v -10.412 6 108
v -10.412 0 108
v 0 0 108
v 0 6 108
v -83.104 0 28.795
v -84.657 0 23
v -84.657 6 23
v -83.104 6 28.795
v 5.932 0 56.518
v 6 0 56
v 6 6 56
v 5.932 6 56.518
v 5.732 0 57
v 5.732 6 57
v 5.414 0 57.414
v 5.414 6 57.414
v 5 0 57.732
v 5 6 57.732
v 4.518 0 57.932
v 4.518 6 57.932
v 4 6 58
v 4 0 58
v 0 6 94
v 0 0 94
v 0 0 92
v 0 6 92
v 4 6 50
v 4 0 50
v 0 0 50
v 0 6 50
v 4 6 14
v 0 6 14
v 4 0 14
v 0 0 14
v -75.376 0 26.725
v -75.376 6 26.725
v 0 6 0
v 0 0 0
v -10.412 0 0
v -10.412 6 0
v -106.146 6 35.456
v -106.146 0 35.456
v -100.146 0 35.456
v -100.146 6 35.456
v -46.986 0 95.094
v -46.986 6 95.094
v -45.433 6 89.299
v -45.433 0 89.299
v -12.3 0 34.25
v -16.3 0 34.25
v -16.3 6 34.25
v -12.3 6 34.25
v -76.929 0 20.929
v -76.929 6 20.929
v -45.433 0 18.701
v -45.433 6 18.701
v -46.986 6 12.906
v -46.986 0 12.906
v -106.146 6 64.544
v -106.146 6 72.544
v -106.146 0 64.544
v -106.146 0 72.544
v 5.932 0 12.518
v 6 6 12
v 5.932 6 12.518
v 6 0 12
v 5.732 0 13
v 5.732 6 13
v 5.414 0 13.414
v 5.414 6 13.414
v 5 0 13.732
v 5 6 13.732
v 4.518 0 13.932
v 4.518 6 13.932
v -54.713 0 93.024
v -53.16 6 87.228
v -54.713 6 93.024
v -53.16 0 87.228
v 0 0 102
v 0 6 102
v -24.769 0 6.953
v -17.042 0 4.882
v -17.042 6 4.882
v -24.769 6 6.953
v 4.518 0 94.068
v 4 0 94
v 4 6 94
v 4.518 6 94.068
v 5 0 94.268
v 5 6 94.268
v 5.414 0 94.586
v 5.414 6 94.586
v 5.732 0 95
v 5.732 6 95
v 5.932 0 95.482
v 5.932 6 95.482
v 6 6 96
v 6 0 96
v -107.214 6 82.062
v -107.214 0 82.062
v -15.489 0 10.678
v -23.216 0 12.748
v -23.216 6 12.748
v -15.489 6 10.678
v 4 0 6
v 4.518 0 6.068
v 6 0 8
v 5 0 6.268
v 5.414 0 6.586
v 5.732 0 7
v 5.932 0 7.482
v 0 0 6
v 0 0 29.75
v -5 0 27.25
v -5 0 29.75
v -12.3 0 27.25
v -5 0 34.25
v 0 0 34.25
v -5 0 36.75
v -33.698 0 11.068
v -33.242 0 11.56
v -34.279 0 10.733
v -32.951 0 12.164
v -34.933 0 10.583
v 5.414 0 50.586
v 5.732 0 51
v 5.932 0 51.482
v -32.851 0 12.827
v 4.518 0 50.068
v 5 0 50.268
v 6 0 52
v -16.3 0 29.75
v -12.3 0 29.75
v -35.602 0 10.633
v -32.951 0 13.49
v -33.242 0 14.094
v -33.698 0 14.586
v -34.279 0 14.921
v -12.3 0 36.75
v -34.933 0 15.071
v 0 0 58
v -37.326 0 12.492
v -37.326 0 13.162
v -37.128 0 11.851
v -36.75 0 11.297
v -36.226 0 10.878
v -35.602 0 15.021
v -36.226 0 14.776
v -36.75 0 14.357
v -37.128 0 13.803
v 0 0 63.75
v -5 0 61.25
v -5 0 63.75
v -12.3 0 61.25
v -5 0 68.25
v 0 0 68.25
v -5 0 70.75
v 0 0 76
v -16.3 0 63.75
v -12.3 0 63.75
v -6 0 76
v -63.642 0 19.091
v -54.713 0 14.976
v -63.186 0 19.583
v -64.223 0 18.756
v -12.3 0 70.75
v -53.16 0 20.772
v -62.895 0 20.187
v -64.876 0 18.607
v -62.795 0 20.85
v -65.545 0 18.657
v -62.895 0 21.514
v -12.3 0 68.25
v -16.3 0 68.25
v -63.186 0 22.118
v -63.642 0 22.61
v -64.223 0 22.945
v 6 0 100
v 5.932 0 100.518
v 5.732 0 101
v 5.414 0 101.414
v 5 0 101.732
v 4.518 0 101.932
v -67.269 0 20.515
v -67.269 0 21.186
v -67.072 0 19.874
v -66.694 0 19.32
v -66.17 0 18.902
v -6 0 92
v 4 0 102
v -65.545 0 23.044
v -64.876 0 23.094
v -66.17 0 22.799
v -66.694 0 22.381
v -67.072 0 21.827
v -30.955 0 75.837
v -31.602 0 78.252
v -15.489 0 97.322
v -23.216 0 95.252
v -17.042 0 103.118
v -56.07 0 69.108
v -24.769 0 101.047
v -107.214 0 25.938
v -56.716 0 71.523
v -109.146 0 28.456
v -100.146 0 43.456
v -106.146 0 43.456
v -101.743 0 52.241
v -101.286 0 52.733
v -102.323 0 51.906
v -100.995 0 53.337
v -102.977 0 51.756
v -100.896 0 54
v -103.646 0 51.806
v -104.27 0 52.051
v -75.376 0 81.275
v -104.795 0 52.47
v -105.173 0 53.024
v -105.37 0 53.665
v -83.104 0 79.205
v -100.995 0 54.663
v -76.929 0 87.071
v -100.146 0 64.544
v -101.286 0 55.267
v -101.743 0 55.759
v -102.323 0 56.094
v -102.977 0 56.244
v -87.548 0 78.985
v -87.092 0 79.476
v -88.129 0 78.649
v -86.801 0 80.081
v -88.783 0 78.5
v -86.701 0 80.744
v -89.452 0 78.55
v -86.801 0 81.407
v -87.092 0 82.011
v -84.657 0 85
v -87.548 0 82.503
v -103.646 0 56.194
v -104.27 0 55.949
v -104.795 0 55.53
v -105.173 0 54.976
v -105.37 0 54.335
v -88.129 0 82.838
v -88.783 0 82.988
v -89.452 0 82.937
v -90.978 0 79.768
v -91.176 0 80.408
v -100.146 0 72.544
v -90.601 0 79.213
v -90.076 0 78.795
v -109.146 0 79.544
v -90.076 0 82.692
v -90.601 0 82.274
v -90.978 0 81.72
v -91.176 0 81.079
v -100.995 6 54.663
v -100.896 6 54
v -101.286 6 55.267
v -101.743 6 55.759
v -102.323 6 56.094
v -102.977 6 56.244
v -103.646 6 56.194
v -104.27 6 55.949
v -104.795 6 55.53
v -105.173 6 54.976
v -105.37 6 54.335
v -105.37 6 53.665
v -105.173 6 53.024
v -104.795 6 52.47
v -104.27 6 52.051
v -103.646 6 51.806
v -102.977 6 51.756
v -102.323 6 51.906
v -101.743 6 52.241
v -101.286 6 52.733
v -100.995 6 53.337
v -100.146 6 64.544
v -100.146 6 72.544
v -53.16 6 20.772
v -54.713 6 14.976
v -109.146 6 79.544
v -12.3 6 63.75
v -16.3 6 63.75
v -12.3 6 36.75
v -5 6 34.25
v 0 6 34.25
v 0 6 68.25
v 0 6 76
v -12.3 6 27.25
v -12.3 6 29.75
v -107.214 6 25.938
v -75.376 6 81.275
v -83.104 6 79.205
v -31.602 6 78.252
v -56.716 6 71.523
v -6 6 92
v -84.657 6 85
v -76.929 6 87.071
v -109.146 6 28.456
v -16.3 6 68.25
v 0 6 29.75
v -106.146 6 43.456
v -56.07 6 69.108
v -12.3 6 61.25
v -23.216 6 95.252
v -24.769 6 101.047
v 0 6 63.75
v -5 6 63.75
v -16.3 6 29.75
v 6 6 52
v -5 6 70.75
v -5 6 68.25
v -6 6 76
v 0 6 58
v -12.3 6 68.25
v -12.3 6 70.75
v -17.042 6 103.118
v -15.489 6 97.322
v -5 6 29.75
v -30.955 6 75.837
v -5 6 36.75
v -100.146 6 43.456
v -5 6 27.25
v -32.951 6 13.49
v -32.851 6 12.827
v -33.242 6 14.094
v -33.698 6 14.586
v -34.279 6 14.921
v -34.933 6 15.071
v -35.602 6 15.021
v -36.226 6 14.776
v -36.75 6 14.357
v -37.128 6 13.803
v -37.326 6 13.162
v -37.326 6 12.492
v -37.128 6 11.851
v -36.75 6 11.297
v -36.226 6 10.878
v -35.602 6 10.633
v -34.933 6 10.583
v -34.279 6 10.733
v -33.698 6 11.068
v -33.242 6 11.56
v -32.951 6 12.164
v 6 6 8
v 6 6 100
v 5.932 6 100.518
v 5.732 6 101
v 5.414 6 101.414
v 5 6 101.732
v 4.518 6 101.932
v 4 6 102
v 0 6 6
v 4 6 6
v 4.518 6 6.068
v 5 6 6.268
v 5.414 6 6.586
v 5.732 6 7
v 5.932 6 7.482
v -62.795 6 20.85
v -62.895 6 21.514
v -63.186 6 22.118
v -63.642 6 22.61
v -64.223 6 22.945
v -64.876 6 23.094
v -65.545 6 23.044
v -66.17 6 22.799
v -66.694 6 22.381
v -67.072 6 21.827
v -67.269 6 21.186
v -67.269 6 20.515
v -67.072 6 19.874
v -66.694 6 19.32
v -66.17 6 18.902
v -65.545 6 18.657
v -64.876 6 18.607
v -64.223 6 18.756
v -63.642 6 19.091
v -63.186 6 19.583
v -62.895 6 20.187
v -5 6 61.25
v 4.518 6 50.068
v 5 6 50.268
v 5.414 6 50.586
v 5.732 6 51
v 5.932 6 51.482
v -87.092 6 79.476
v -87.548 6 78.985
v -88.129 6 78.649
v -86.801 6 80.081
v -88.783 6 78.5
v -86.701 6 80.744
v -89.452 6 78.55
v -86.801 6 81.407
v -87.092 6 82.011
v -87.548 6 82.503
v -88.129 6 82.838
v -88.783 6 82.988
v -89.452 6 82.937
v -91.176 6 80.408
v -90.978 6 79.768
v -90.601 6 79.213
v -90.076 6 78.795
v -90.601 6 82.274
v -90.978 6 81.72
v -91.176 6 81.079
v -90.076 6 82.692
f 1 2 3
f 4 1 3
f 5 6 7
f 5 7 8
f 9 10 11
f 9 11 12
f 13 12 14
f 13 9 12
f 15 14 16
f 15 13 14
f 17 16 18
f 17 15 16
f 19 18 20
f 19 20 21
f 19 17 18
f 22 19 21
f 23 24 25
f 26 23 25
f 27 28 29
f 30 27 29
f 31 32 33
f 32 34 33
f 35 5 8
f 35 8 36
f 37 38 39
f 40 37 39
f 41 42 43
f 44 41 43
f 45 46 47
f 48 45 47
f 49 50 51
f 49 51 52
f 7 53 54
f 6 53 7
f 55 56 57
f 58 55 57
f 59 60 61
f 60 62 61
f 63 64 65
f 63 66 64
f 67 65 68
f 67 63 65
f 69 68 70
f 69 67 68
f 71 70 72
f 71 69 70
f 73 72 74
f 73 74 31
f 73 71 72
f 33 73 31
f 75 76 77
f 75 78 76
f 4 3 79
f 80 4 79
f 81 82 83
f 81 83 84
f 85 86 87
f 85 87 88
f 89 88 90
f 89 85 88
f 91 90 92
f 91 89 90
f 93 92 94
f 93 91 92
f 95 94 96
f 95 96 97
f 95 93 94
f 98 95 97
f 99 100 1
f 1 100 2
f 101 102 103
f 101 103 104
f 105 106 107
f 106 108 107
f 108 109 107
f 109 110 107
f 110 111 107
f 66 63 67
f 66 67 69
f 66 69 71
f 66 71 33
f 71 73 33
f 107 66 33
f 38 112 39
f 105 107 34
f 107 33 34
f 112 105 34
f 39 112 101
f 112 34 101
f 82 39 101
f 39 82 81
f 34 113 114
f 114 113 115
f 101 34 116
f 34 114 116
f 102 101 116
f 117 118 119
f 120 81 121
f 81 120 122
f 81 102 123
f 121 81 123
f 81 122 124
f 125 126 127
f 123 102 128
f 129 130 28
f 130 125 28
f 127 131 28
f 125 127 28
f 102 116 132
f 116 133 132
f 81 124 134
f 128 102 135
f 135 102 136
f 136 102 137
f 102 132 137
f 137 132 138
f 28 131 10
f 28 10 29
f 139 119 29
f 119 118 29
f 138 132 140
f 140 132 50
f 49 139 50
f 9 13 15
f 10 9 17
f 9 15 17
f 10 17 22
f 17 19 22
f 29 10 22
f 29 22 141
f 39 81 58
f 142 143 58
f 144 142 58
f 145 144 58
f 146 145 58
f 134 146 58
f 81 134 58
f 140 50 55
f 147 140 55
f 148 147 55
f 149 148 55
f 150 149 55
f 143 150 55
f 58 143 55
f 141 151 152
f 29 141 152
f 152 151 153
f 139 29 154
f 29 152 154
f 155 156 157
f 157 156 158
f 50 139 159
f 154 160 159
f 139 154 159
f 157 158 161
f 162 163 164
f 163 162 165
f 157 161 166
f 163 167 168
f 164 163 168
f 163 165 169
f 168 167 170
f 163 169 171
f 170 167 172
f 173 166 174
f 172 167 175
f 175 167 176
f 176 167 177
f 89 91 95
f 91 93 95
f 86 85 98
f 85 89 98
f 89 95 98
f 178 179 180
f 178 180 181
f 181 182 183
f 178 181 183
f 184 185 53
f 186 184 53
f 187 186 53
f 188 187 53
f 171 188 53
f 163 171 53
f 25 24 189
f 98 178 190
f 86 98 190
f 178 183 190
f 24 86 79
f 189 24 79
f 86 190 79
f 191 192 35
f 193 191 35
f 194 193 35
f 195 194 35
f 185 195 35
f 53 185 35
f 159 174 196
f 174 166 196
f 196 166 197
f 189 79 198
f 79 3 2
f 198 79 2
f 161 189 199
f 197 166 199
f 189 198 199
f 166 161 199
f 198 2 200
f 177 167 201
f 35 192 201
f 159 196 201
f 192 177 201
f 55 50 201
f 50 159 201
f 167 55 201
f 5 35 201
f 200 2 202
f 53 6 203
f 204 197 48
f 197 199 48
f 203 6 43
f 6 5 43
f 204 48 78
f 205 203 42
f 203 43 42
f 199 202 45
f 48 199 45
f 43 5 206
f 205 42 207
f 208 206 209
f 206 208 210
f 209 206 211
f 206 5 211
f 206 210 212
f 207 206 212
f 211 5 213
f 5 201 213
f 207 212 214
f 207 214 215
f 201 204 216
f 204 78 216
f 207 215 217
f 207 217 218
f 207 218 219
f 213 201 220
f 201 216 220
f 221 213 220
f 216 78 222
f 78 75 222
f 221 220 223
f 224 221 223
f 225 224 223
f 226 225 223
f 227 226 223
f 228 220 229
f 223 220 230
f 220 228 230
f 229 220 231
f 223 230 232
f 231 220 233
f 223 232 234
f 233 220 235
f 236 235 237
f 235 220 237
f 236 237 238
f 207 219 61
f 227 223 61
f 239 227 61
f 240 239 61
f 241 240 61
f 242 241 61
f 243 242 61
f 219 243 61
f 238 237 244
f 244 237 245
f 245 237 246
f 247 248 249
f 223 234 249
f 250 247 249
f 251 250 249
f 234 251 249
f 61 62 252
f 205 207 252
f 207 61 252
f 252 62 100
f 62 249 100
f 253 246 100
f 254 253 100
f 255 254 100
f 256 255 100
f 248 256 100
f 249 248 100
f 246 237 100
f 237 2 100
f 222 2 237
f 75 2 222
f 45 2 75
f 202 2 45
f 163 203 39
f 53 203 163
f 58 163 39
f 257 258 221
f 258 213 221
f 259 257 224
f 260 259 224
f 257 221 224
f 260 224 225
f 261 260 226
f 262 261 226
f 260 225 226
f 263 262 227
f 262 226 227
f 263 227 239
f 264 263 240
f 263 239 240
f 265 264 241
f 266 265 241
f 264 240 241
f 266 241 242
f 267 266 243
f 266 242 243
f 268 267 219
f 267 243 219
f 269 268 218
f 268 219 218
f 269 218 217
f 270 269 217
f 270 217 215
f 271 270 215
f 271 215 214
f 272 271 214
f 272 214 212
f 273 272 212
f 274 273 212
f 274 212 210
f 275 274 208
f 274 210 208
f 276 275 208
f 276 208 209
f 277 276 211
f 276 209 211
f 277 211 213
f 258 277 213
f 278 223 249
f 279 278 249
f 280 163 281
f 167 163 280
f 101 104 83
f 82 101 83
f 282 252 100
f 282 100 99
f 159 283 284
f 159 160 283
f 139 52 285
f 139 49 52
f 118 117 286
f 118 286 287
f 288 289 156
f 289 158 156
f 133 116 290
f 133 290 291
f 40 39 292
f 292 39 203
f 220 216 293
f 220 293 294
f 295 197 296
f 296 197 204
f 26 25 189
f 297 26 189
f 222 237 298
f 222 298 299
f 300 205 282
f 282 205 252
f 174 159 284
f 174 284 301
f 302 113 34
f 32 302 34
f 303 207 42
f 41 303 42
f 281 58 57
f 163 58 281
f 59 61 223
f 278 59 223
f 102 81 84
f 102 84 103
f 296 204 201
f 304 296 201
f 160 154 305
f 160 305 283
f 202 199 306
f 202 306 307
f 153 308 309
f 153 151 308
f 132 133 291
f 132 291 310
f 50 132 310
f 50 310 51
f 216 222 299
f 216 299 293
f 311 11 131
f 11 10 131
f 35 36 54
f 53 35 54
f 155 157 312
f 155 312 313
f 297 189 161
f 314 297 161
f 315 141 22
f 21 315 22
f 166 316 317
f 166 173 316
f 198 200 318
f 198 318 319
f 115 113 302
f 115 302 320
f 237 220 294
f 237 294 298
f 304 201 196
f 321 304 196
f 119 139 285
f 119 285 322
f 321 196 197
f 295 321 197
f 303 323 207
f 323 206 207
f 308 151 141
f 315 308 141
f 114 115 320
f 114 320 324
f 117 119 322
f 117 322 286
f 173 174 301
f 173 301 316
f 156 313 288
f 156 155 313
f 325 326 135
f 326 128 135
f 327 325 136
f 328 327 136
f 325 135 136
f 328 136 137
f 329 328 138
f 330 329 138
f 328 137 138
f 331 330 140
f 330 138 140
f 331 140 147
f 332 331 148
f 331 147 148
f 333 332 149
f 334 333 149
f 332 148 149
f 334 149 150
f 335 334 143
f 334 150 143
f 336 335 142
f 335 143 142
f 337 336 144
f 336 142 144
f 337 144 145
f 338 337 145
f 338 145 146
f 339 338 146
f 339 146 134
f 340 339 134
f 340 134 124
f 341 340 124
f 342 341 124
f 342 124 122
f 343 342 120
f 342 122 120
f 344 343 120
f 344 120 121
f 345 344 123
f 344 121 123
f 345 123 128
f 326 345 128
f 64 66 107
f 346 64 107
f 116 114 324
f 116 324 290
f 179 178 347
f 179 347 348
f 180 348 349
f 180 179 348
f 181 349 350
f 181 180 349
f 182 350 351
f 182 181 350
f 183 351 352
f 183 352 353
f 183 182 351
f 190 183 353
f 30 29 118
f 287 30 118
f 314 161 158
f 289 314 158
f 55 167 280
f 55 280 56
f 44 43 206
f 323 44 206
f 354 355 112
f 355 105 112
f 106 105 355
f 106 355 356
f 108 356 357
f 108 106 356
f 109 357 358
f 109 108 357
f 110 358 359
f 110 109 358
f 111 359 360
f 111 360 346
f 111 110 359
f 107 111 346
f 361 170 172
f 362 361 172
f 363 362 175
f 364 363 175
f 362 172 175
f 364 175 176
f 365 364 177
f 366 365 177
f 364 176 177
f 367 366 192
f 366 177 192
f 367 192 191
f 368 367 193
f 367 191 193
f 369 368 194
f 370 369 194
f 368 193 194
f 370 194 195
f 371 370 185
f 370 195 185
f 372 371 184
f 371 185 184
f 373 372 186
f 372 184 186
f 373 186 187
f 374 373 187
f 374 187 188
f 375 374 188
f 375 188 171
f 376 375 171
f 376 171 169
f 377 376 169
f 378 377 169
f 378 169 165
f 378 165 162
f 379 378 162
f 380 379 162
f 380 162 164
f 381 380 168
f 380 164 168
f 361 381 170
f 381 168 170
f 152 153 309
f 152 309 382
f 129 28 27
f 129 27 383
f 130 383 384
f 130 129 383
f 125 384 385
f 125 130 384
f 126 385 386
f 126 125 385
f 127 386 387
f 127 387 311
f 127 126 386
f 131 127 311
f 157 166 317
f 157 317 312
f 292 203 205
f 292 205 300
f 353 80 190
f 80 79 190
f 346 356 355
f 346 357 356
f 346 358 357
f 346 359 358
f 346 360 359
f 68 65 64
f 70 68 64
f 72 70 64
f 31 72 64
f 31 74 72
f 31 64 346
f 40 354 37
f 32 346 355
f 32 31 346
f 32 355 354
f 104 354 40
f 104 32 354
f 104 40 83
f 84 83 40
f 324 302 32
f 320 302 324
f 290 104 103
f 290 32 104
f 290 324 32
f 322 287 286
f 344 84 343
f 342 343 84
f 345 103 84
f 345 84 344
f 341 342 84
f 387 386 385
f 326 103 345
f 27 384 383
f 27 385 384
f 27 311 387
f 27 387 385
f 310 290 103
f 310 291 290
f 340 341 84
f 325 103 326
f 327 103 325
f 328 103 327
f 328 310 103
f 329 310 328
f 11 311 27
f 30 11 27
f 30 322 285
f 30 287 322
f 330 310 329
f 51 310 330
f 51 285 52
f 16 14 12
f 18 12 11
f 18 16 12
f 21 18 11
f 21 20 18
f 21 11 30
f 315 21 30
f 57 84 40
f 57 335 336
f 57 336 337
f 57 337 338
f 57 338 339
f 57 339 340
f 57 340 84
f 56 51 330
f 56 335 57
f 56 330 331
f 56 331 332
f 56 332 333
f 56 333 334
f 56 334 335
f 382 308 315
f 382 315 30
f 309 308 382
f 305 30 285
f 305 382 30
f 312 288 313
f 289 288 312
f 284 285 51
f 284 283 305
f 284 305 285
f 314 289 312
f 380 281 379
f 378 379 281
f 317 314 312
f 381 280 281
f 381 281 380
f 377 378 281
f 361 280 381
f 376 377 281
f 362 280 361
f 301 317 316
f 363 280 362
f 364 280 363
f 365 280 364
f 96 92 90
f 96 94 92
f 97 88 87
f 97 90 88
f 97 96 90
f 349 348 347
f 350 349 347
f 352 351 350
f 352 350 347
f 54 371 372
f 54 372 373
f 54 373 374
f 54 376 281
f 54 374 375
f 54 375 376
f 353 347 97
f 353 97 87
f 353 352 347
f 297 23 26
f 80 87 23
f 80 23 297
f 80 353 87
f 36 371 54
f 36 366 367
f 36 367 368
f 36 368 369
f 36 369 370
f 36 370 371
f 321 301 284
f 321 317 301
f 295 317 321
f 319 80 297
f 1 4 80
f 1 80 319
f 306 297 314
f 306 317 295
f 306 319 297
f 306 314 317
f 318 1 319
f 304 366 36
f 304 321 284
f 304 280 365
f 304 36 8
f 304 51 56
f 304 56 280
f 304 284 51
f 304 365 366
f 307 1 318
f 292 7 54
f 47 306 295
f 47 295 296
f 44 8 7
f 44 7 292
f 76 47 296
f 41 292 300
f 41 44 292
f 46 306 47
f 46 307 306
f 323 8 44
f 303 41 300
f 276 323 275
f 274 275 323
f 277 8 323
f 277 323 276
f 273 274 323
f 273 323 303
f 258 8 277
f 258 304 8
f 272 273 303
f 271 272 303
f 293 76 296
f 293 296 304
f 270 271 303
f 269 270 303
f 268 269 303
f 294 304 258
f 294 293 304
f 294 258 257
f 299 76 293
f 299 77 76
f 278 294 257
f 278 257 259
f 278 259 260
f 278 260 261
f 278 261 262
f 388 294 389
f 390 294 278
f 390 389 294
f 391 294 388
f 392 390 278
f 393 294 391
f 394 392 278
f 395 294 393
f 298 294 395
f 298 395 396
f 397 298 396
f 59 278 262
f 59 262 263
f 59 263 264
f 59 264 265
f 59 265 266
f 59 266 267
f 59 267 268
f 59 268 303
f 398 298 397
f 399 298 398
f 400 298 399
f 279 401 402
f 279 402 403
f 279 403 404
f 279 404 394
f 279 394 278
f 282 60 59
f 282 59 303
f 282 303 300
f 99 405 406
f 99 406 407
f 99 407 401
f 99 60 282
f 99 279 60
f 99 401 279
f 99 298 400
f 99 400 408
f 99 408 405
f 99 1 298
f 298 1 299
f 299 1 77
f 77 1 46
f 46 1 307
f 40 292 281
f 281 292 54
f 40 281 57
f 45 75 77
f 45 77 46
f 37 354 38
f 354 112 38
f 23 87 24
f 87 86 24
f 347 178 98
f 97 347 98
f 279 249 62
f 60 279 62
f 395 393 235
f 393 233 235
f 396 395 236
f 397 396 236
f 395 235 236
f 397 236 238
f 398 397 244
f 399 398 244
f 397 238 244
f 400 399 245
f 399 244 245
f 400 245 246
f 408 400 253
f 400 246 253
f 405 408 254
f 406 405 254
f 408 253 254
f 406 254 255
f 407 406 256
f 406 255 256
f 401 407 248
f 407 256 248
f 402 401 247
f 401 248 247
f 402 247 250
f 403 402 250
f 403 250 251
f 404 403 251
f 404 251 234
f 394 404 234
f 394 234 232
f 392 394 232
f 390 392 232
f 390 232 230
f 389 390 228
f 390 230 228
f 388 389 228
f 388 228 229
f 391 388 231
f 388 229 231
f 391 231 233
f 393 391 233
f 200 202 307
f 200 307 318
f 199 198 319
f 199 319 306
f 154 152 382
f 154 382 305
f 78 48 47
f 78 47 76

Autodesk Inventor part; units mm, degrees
ref_plane "YZ Plane" through (0, 0, 0) normal (1, 0, 0) x (0, 1, 0)
ref_plane "XZ Plane" through (0, 0, 0) normal (0, 1, 0) x (-1, 0, 0)
ref_plane "XY Plane" through (0, 0, 0) normal (0, 0, 1) x (1, 0, 0)
sketch "Sketch1" plane through (0, 0, 0) normal (0, 1, 0) x (-1, 0, 0)
  line L0 (0, 108) -> (0, 0)
  line L1 (0, 0) -> (10.412, 0)
  line L2 (10.412, 0) -> (109.1455, 26.4556)
  line L3 (109.1455, 26.4556) -> (109.1455, 81.5444)
  line L4 (109.1455, 81.5444) -> (10.412, 108)
  line L5 (10.412, 108) -> (0, 108)
  line L6 (2.5529, 107) -> (1, 101.2044) construction
  line L7 (1, 101.2044) -> (97.5926, 75.3225) construction
  line L8 (97.5926, 75.3225) -> (99.1455, 81.1181) construction
  line L9 (99.1455, 81.1181) -> (2.5529, 107) construction
  line L10 (1, 6.7956) -> (2.5529, 1) construction
  line L11 (2.5529, 1) -> (99.1455, 26.8819) construction
  line L12 (99.1455, 26.8819) -> (97.5926, 32.6775) construction
  line L13 (97.5926, 32.6775) -> (1, 6.7956) construction
  line L14 (100.1455, 80.5444) -> (106.1455, 80.5444) construction
  line L15 (106.1455, 80.5444) -> (106.1455, 27.4556) construction
  line L16 (106.1455, 27.4556) -> (100.1455, 27.4556) construction
  line L17 (100.1455, 27.4556) -> (100.1455, 80.5444) construction
  line L18 (17.0418, 103.1177) -> (15.4889, 97.3222)
  line L19 (15.4889, 97.3222) -> (23.2163, 95.2516)
  line L20 (23.2163, 95.2516) -> (24.7692, 101.0472)
  line L21 (24.7692, 101.0472) -> (17.0418, 103.1177)
  line L22 (46.9855, 95.0943) -> (45.4326, 89.2988)
  line L23 (45.4326, 89.2988) -> (53.16, 87.2282)
  line L24 (53.16, 87.2282) -> (54.7129, 93.0238)
  line L25 (54.7129, 93.0238) -> (46.9855, 95.0943)
  line L26 (76.9292, 87.0709) -> (75.3763, 81.2754)
  line L27 (75.3763, 81.2754) -> (83.1037, 79.2048)
  line L28 (83.1037, 79.2048) -> (84.6566, 85.0004)
  line L29 (84.6566, 85.0004) -> (76.9292, 87.0709)
  line L30 (15.4889, 10.6778) -> (17.0418, 4.8823)
  line L31 (17.0418, 4.8823) -> (24.7692, 6.9528)
  line L32 (24.7692, 6.9528) -> (23.2163, 12.7484)
  line L33 (23.2163, 12.7484) -> (15.4889, 10.6778)
  line L34 (45.4326, 18.7012) -> (46.9855, 12.9057)
  line L35 (46.9855, 12.9057) -> (54.7129, 14.9762)
  line L36 (54.7129, 14.9762) -> (53.16, 20.7718)
  line L37 (53.16, 20.7718) -> (45.4326, 18.7012)
  line L38 (75.3763, 26.7246) -> (76.9292, 20.9291)
  line L39 (76.9292, 20.9291) -> (84.6566, 22.9996)
  line L40 (84.6566, 22.9996) -> (83.1037, 28.7952)
  line L41 (83.1037, 28.7952) -> (75.3763, 26.7246)
  line L42 (23.9928, 98.1494) -> (46.209, 92.1965) construction
  line L43 (53.9365, 90.126) -> (76.1527, 84.1732) construction
  line L44 (23.9928, 9.8506) -> (46.209, 15.8035) construction
  line L45 (53.9365, 17.874) -> (76.1527, 23.8268) construction
  line L46 (83.8802, 82.1026) -> (98.369, 78.2203) construction
  line L47 (16.2653, 7.7801) -> (1.7765, 3.8978) construction
  line L48 (83.8802, 25.8974) -> (98.369, 29.7797) construction
  line L49 (16.2653, 100.2199) -> (1.7765, 104.1022) construction
  line L50 (100.1455, 72.5444) -> (106.1455, 72.5444)
  line L51 (106.1455, 72.5444) -> (106.1455, 64.5444)
  line L52 (106.1455, 64.5444) -> (100.1455, 64.5444)
  line L53 (100.1455, 64.5444) -> (100.1455, 72.5444)
  line L54 (100.1455, 43.4556) -> (106.1455, 43.4556)
  line L55 (106.1455, 43.4556) -> (106.1455, 35.4556)
  line L56 (106.1455, 35.4556) -> (100.1455, 35.4556)
  line L57 (100.1455, 35.4556) -> (100.1455, 43.4556)
  line L58 (103.1455, 72.5444) -> (103.1455, 80.5444) construction
  line L59 (103.1455, 35.4556) -> (103.1455, 27.4556) construction
  dimension "d0" = 100
  dimension "d1" = 6
  dimension "d3" = 100
  dimension "d4" = 6
  dimension "d7" = 3
  dimension "d8" = 3
  dimension "d9" = 6
  dimension "d10" = 3
  dimension "d11" = 1
  dimension "d12" = 1
  dimension "d13" = 1
  dimension "d14" = 1
  dimension "d15" = 15
  dimension "d16" = 1
  dimension "d17" = 1
  dimension "d18" = 1
  dimension "d19" = 108
  dimension "d20" = 8
  dimension "d21" = 15
  dimension "d22" = 8
extrude "Extrusion1" add sketch "Sketch1" along normal blind 6
sketch "Sketch2" plane through (0, 0, 0) normal (0, -1, 0) x (1, 0, 0)
  line L0 (0, 0) -> (0, 108) projected
  line L1 (0, 102) -> (4, 102)
  line L2 (6, 100) -> (6, 96)
  line L3 (4, 94) -> (0, 94)
  line L4 (0, 94) -> (0, 102)
  line L5 (0, 58) -> (4, 58)
  line L6 (6, 56) -> (6, 52)
  line L7 (4, 50) -> (0, 50)
  line L8 (0, 50) -> (0, 58)
  line L9 (0, 14) -> (4, 14)
  line L10 (6, 12) -> (6, 8)
  line L11 (4, 6) -> (0, 6)
  line L12 (0, 6) -> (0, 14)
  arc A0 (6, 100) -> (4, 102) centre (4, 100) ccw
  arc A1 (4, 94) -> (6, 96) centre (4, 96) ccw
  arc A2 (6, 56) -> (4, 58) centre (4, 56) ccw
  arc A3 (4, 50) -> (6, 52) centre (4, 52) ccw
  arc A4 (6, 12) -> (4, 14) centre (4, 12) ccw
  arc A5 (4, 6) -> (6, 8) centre (4, 8) ccw
  line L13 (2, 94) -> (2, 58) construction
  line L14 (2, 50) -> (2, 14) construction
  line L15 (0, 108) -> (-10.412, 108) projected
  point P0 (6, 54)
  point P1 (0, 54)
  dimension "d25" = 2
  dimension "d26" = 6
  dimension "d27" = 8
  dimension "d28" = 8
  dimension "d29" = 8
  dimension "d38" = 6
extrude "Extrusion2" add sketch "Sketch2" against normal blind 6
sketch "Sketch3" plane through (0, 0, 0) normal (0, -1, 0) x (1, 0, 0)
  line L0 (0, 58) -> (0, 94) projected
  line L1 (0, 108) -> (-10.412, 108) projected
  line L2 (0, 92) -> (-6, 92)
  line L3 (-6, 92) -> (-6, 76)
  line L4 (-6, 76) -> (0, 76)
  line L5 (0, 76) -> (0, 92)
  dimension "d33" = 16
  dimension "d34" = 6
  dimension "d35" = 16
extrude "Extrusion3" cut sketch "Sketch3" against normal blind 6
sketch "Sketch4" plane through (0, 0, 0) normal (0, -1, 0) x (1, 0, 0)
  line L0 (-10.412, 108) -> (-109.1455, 81.5444) projected
  line L1 (0, 58) -> (0, 76) projected
  line L2 (-23.2163, 95.2516) -> (-24.7692, 101.0472) projected
  line L3 (-56.7165, 71.5226) -> (-56.0695, 69.1077)
  line L4 (-56.0695, 69.1077) -> (-30.9554, 75.837)
  line L5 (-30.9554, 75.837) -> (-31.6024, 78.2519)
  line L6 (-31.6024, 78.2519) -> (-56.7165, 71.5226)
  line L7 (-56.1041, 71.169) -> (-55.7159, 69.7201) construction
  line L8 (-55.7159, 69.7201) -> (-31.5678, 76.1906) construction
  line L9 (-31.5678, 76.1906) -> (-31.956, 77.6395) construction
  line L10 (-31.956, 77.6395) -> (-56.1041, 71.169) construction
  line L11 (-44.1595, 74.8872) -> (-43.5124, 72.4724) construction
  line L12 (-31.2789, 77.0445) -> (-56.393, 70.3152) construction
  point P0 (-44.0301, 74.4042)
  point P1 (-31.7619, 76.915)
  dimension "d39" = 26
  dimension "d41" = 2.5
  dimension "d43" = 1.5
  dimension "d44" = 25
  dimension "d45" = 31.956
  dimension "d48" = 23.75
extrude "Extrusion4" cut sketch "Sketch4" against normal through all
chamfer "Chamfer1" distance 2 angle 45 2 edges at (-109.1455, 3, 81.5444) (-109.1455, 3, 26.4556)
sketch "Sketch5" plane through (0, 0, 0) normal (0, -1, 0) x (1, 0, 0)
  line L0 (-83.1037, 79.2048) -> (-84.6566, 85.0004) projected
  circle A0 centre (-88.9513, 80.7438) radius 2.25
  line L1 (-88.9513, 80.7438) -> (-83.8802, 82.1026) construction
  line L2 (-106.1455, 64.5444) -> (-100.1455, 43.4556) construction
  line L3 (-106.1455, 43.4556) -> (-100.1455, 64.5444) construction
  line L4 (-75.3763, 26.7246) -> (-54.7129, 14.9762) construction
  line L5 (-53.16, 20.7718) -> (-76.9292, 20.9291) construction
  line L6 (-45.4326, 18.7012) -> (-24.7692, 6.9528) construction
  line L7 (-46.9855, 12.9057) -> (-23.2163, 12.7484) construction
  circle A1 centre (-103.1455, 54) radius 2.25
  circle A2 centre (-65.0446, 20.8504) radius 2.25
  circle A3 centre (-35.1009, 12.827) radius 2.25
  dimension "d52" = 5.25
  dimension "d53" = 4.5
extrude "Extrusion5" cut sketch "Sketch5" against normal through all
sketch "Sketch6" plane through (0, 0, 0) normal (0, -1, 0) x (1, 0, 0)
  line L0 (0, 14) -> (0, 50) projected
  line L1 (4, 58) -> (0, 58) projected
  line L2 (0, 58) -> (0, 76) projected
  line L3 (0, 68.25) -> (0, 63.75)
  line L4 (-16.3, 63.75) -> (-16.3, 68.25)
  line L5 (-12.3, 70.75) -> (-5, 70.75)
  line L6 (-5, 61.25) -> (-12.3, 61.25)
  line L7 (-16.3, 68.25) -> (-12.3, 68.25)
  line L8 (-5, 68.25) -> (0, 68.25)
  line L9 (0, 63.75) -> (-5, 63.75)
  line L10 (-12.3, 63.75) -> (-16.3, 63.75)
  line L11 (-12.3, 61.25) -> (-12.3, 63.75)
  line L12 (-12.3, 68.25) -> (-12.3, 70.75)
  line L13 (-5, 70.75) -> (-5, 68.25)
  line L14 (-5, 63.75) -> (-5, 61.25)
  line L15 (0, 34.25) -> (0, 29.75)
  line L16 (-16.3, 29.75) -> (-16.3, 34.25)
  line L17 (-12.3, 36.75) -> (-5, 36.75)
  line L18 (-5, 27.25) -> (-12.3, 27.25)
  line L19 (-16.3, 34.25) -> (-12.3, 34.25)
  line L20 (-5, 34.25) -> (0, 34.25)
  line L21 (0, 29.75) -> (-5, 29.75)
  line L22 (-12.3, 29.75) -> (-16.3, 29.75)
  line L23 (-12.3, 27.25) -> (-12.3, 29.75)
  line L24 (-12.3, 34.25) -> (-12.3, 36.75)
  line L25 (-5, 36.75) -> (-5, 34.25)
  line L26 (-5, 29.75) -> (-5, 27.25)
  point P0 (0, 32)
  point P1 (-16.3, 66)
  dimension "d56" = 4.5
  dimension "d57" = 2.5
  dimension "d58" = 2.5
  dimension "d59" = 4
  dimension "d60" = 5
  dimension "d61" = 7.3
  dimension "d62" = 4.5
  dimension "d63" = 2.5
  dimension "d64" = 2.5
  dimension "d65" = 4
  dimension "d66" = 5
  dimension "d67" = 7.3
  dimension "d68" = 8
extrude "Extrusion6" cut sketch "Sketch6" against normal through all
equation "\"d3\" = d0"
equation "\"d4\" = d1"
equation "\"d8\" = d7"
equation "\"d9\" = d1"
equation "\"d10\" = d7"
equation "\"d12\" = d11"
equation "\"d28\" = d27"
equation "\"d29\" = d28"
equation "\"d58\" = d57"
equation "\"d64\" = d63"
properties part number "front_panel_2004_brace"
